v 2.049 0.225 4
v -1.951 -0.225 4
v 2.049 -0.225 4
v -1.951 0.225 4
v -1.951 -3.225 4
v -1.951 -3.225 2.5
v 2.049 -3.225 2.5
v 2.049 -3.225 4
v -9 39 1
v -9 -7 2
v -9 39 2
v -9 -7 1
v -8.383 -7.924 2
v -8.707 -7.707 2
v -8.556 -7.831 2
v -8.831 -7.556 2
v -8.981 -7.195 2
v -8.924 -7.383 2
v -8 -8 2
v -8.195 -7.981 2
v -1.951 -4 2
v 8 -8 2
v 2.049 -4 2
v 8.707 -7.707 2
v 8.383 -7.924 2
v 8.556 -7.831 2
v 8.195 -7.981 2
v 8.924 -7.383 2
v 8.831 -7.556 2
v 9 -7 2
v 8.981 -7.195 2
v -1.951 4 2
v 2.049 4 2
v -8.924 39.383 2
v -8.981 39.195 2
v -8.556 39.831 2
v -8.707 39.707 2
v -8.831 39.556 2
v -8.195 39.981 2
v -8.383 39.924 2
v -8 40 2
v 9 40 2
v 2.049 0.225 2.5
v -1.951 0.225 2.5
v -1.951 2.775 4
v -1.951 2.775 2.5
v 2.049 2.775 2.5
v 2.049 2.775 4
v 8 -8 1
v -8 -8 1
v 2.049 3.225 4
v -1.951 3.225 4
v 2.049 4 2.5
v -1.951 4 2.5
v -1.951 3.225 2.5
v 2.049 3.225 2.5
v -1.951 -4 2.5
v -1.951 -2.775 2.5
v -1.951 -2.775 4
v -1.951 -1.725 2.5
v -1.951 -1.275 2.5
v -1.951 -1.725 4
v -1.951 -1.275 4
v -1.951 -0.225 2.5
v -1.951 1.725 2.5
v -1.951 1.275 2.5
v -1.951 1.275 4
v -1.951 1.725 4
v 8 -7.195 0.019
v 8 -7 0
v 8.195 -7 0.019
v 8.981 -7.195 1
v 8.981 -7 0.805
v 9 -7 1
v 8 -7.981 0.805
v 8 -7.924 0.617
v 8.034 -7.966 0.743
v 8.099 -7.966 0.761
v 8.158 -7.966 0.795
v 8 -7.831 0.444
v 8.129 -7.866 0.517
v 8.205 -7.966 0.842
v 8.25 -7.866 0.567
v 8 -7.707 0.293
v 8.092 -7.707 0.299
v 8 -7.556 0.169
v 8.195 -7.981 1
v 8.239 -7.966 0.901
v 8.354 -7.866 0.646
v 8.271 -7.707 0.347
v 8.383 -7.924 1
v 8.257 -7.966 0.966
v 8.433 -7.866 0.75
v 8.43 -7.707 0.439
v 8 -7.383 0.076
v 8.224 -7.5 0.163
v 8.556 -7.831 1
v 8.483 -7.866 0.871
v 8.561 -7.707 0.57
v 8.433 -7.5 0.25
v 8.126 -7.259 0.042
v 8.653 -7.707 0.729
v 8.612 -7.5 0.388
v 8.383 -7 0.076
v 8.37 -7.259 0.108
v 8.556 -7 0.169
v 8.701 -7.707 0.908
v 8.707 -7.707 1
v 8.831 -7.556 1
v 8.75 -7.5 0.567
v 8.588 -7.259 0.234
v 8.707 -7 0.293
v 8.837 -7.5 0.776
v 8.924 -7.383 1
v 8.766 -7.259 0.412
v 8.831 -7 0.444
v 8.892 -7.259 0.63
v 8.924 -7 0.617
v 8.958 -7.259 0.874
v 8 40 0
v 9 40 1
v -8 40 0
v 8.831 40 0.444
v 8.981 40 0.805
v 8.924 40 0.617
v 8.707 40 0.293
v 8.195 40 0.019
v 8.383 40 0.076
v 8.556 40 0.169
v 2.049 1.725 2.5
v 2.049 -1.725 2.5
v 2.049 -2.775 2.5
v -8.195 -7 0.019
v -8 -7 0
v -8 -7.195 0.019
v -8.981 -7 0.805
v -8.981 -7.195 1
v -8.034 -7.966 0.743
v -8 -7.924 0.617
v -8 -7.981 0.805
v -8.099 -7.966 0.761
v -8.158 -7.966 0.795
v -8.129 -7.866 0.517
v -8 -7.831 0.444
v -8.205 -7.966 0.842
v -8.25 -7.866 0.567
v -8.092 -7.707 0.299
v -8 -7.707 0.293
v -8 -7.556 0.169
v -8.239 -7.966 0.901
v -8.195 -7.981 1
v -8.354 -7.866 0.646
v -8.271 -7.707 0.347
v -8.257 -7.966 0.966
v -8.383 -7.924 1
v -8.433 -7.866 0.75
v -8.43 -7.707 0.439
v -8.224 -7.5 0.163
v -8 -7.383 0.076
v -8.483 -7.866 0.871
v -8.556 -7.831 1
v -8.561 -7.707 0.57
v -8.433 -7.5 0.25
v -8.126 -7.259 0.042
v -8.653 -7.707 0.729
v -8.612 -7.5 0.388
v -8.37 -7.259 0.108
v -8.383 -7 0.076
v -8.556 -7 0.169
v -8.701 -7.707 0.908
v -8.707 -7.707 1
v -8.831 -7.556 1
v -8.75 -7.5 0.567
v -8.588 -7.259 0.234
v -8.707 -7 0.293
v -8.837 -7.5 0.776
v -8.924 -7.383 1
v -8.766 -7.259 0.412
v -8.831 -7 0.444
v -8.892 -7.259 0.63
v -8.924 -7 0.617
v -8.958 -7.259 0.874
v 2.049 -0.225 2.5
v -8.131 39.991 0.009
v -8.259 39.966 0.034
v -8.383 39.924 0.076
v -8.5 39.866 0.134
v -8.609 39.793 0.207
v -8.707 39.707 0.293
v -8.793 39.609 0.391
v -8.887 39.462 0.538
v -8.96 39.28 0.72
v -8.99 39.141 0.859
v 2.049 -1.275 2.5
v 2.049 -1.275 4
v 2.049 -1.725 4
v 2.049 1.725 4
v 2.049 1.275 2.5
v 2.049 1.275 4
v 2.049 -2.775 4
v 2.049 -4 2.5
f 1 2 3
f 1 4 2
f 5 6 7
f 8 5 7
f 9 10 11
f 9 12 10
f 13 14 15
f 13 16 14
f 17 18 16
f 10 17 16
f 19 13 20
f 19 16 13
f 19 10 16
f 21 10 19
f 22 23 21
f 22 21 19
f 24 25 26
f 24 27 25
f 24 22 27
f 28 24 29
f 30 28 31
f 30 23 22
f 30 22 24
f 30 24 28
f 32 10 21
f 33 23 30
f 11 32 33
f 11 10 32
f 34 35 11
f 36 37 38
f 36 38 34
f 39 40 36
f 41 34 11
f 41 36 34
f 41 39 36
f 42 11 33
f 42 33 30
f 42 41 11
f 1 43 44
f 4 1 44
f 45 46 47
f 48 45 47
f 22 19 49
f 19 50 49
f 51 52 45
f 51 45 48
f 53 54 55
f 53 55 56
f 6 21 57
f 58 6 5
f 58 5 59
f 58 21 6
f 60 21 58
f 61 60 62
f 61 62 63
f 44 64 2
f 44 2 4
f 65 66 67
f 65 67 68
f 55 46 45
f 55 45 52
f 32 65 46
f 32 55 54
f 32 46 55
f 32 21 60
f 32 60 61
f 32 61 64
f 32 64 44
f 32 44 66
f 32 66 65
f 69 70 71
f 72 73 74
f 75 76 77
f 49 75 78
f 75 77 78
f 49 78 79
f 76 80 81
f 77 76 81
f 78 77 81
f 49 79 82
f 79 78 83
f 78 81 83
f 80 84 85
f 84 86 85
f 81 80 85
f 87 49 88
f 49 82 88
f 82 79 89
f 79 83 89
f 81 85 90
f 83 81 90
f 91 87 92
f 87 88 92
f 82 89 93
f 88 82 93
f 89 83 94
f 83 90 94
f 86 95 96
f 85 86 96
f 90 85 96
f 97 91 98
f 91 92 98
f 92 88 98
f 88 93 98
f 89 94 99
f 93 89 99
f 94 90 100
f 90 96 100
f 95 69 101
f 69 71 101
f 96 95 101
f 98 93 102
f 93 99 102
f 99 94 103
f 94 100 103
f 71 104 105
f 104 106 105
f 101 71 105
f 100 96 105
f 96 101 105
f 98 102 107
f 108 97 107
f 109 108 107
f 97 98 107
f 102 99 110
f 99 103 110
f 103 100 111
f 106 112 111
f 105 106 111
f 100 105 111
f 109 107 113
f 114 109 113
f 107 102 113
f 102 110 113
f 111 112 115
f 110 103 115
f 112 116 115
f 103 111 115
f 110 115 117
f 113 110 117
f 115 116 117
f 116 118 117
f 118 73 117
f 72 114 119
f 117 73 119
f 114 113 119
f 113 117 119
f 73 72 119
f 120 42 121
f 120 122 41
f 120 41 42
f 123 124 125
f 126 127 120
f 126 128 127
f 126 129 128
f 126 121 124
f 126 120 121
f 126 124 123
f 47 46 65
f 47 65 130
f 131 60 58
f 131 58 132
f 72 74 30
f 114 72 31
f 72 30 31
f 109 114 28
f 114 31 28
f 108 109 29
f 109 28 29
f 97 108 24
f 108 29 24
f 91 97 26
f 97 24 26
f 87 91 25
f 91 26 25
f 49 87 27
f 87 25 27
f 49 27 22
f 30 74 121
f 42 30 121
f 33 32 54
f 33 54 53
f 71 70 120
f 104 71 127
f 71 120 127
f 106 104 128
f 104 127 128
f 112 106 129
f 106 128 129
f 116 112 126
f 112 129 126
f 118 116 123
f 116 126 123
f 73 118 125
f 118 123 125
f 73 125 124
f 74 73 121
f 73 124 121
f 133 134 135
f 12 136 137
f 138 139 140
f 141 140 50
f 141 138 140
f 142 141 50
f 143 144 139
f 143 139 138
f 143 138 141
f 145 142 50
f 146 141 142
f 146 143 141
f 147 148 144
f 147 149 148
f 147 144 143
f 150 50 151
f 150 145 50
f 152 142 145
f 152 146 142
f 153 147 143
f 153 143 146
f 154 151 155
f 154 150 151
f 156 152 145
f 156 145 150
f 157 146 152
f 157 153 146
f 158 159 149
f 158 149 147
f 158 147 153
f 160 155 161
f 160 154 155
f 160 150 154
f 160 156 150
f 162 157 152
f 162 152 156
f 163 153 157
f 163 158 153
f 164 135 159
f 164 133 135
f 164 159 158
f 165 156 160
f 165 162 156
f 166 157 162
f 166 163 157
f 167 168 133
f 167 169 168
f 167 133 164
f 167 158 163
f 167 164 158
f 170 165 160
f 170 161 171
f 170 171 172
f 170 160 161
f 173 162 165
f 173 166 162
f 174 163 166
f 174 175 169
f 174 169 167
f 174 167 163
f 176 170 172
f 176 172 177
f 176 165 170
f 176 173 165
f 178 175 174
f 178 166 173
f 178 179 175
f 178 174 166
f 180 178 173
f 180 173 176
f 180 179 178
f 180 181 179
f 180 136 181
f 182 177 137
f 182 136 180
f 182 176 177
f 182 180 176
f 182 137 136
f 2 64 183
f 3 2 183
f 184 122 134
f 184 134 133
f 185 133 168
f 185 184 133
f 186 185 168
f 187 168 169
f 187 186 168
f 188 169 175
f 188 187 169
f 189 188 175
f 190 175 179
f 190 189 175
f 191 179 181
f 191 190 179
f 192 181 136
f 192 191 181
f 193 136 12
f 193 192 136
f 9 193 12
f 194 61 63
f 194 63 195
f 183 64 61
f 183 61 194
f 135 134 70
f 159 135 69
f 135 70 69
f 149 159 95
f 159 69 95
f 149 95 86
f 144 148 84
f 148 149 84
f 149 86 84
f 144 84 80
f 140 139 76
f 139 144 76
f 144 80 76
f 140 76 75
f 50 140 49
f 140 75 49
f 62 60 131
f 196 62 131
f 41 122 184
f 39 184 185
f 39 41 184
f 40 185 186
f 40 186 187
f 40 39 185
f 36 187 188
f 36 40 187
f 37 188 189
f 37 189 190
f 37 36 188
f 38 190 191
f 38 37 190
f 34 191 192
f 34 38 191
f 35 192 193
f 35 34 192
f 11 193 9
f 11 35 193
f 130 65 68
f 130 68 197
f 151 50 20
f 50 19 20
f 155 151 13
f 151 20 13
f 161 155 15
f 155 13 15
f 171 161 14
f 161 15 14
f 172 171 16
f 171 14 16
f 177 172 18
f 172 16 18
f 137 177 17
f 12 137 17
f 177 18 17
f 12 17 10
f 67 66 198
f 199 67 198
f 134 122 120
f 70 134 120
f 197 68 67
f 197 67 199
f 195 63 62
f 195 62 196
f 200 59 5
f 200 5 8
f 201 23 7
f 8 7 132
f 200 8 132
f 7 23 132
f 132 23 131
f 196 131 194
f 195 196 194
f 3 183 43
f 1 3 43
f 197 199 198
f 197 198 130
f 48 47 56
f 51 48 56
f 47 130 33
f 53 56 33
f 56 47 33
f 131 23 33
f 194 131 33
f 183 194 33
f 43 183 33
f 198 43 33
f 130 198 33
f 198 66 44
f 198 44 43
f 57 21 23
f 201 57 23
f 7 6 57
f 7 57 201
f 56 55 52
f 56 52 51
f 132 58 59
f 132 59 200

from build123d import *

# Parameters (mm, degrees)
F0_W     = 18
F0_H     = 48
F1_DEPTH = 2
F0_W_2   = 4
F0_H_2   = 0.775
F0_H_3   = 1.05
F2_DEPTH = 2.5
F0_H_4   = 0.45
F3_DEPTH = 4
F4_R     = 1


with BuildPart() as f1:
    # F0 (on Top) → F1 (new body)
    with BuildSketch(Plane.XY):
        with Locations((0, 16)):
            Rectangle(F0_W, F0_H)
        Polygon((2.04878, -3.225), (2.04878, -4), (-1.95122, -4), (-1.95122, -3.225), (-1.95122, -2.775), (-1.95122, -1.725), (-1.95122, -1.275), (-1.95122, -0.225), (-1.95122, 0), (-1.95122, 0.107463), (-1.95122, 0.225), (-1.95122, 1.275), (-1.95122, 1.725), (-1.95122, 2.775), (-1.95122, 3.225), (-1.95122, 4), (2.04878, 4), (2.04878, 3.225), (2.04878, 2.775), (2.04878, 1.725), (2.04878, 1.275), (2.04878, 0.225), (2.04878, -0.225), (2.04878, -1.275), (2.04878, -1.725), (2.04878, -2.775), align=None, mode=Mode.SUBTRACT)
    extrude(amount=F1_DEPTH)

    # F0 (on Top) → F2 (join)
    with BuildSketch(Plane.XY):
        with Locations((0.04878, -3.6125)):
            Rectangle(F0_W_2, F0_H_2)
        with Locations((0.04878, -2.25)):
            Rectangle(F0_W_2, F0_H_3)
        with Locations((0.04878, -0.75)):
            Rectangle(F0_W_2, F0_H_3)
        with Locations((0.04878, 0.75)):
            Rectangle(F0_W_2, F0_H_3)
        with Locations((0.04878, 2.25)):
            Rectangle(F0_W_2, F0_H_3)
        with Locations((0.04878, 3.6125)):
            Rectangle(F0_W_2, F0_H_2)
    extrude(amount=F2_DEPTH)

    # F0 (on Top) → F3 (join)
    with BuildSketch(Plane.XY):
        with Locations((0.04878, -3)):
            Rectangle(F0_W_2, F0_H_4)
        with Locations((0.04878, -1.5)):
            Rectangle(F0_W_2, F0_H_4)
        Polygon((-1.95122, -0.225), (2.04878, -0.225), (2.04878, 0.225), (-1.95122, 0.225), (-1.95122, 0.107463), (-1.95122, 0), align=None)
        with Locations((0.04878, 1.5)):
            Rectangle(F0_W_2, F0_H_4)
        with Locations((0.04878, 3)):
            Rectangle(F0_W_2, F0_H_4)
    extrude(amount=F3_DEPTH)

    # F4
    f4_edges = [f1.edges().sort_by_distance(p)[0] for p in [
        (9, 16, 0),
        (-9, 16, 0),
        (0, -8, 0),
        (-9, 40, 1),
        (9, -8, 1),
        (-9, -8, 1),
    ]]
    fillet(f4_edges, radius=F4_R)


solid = f1.part
